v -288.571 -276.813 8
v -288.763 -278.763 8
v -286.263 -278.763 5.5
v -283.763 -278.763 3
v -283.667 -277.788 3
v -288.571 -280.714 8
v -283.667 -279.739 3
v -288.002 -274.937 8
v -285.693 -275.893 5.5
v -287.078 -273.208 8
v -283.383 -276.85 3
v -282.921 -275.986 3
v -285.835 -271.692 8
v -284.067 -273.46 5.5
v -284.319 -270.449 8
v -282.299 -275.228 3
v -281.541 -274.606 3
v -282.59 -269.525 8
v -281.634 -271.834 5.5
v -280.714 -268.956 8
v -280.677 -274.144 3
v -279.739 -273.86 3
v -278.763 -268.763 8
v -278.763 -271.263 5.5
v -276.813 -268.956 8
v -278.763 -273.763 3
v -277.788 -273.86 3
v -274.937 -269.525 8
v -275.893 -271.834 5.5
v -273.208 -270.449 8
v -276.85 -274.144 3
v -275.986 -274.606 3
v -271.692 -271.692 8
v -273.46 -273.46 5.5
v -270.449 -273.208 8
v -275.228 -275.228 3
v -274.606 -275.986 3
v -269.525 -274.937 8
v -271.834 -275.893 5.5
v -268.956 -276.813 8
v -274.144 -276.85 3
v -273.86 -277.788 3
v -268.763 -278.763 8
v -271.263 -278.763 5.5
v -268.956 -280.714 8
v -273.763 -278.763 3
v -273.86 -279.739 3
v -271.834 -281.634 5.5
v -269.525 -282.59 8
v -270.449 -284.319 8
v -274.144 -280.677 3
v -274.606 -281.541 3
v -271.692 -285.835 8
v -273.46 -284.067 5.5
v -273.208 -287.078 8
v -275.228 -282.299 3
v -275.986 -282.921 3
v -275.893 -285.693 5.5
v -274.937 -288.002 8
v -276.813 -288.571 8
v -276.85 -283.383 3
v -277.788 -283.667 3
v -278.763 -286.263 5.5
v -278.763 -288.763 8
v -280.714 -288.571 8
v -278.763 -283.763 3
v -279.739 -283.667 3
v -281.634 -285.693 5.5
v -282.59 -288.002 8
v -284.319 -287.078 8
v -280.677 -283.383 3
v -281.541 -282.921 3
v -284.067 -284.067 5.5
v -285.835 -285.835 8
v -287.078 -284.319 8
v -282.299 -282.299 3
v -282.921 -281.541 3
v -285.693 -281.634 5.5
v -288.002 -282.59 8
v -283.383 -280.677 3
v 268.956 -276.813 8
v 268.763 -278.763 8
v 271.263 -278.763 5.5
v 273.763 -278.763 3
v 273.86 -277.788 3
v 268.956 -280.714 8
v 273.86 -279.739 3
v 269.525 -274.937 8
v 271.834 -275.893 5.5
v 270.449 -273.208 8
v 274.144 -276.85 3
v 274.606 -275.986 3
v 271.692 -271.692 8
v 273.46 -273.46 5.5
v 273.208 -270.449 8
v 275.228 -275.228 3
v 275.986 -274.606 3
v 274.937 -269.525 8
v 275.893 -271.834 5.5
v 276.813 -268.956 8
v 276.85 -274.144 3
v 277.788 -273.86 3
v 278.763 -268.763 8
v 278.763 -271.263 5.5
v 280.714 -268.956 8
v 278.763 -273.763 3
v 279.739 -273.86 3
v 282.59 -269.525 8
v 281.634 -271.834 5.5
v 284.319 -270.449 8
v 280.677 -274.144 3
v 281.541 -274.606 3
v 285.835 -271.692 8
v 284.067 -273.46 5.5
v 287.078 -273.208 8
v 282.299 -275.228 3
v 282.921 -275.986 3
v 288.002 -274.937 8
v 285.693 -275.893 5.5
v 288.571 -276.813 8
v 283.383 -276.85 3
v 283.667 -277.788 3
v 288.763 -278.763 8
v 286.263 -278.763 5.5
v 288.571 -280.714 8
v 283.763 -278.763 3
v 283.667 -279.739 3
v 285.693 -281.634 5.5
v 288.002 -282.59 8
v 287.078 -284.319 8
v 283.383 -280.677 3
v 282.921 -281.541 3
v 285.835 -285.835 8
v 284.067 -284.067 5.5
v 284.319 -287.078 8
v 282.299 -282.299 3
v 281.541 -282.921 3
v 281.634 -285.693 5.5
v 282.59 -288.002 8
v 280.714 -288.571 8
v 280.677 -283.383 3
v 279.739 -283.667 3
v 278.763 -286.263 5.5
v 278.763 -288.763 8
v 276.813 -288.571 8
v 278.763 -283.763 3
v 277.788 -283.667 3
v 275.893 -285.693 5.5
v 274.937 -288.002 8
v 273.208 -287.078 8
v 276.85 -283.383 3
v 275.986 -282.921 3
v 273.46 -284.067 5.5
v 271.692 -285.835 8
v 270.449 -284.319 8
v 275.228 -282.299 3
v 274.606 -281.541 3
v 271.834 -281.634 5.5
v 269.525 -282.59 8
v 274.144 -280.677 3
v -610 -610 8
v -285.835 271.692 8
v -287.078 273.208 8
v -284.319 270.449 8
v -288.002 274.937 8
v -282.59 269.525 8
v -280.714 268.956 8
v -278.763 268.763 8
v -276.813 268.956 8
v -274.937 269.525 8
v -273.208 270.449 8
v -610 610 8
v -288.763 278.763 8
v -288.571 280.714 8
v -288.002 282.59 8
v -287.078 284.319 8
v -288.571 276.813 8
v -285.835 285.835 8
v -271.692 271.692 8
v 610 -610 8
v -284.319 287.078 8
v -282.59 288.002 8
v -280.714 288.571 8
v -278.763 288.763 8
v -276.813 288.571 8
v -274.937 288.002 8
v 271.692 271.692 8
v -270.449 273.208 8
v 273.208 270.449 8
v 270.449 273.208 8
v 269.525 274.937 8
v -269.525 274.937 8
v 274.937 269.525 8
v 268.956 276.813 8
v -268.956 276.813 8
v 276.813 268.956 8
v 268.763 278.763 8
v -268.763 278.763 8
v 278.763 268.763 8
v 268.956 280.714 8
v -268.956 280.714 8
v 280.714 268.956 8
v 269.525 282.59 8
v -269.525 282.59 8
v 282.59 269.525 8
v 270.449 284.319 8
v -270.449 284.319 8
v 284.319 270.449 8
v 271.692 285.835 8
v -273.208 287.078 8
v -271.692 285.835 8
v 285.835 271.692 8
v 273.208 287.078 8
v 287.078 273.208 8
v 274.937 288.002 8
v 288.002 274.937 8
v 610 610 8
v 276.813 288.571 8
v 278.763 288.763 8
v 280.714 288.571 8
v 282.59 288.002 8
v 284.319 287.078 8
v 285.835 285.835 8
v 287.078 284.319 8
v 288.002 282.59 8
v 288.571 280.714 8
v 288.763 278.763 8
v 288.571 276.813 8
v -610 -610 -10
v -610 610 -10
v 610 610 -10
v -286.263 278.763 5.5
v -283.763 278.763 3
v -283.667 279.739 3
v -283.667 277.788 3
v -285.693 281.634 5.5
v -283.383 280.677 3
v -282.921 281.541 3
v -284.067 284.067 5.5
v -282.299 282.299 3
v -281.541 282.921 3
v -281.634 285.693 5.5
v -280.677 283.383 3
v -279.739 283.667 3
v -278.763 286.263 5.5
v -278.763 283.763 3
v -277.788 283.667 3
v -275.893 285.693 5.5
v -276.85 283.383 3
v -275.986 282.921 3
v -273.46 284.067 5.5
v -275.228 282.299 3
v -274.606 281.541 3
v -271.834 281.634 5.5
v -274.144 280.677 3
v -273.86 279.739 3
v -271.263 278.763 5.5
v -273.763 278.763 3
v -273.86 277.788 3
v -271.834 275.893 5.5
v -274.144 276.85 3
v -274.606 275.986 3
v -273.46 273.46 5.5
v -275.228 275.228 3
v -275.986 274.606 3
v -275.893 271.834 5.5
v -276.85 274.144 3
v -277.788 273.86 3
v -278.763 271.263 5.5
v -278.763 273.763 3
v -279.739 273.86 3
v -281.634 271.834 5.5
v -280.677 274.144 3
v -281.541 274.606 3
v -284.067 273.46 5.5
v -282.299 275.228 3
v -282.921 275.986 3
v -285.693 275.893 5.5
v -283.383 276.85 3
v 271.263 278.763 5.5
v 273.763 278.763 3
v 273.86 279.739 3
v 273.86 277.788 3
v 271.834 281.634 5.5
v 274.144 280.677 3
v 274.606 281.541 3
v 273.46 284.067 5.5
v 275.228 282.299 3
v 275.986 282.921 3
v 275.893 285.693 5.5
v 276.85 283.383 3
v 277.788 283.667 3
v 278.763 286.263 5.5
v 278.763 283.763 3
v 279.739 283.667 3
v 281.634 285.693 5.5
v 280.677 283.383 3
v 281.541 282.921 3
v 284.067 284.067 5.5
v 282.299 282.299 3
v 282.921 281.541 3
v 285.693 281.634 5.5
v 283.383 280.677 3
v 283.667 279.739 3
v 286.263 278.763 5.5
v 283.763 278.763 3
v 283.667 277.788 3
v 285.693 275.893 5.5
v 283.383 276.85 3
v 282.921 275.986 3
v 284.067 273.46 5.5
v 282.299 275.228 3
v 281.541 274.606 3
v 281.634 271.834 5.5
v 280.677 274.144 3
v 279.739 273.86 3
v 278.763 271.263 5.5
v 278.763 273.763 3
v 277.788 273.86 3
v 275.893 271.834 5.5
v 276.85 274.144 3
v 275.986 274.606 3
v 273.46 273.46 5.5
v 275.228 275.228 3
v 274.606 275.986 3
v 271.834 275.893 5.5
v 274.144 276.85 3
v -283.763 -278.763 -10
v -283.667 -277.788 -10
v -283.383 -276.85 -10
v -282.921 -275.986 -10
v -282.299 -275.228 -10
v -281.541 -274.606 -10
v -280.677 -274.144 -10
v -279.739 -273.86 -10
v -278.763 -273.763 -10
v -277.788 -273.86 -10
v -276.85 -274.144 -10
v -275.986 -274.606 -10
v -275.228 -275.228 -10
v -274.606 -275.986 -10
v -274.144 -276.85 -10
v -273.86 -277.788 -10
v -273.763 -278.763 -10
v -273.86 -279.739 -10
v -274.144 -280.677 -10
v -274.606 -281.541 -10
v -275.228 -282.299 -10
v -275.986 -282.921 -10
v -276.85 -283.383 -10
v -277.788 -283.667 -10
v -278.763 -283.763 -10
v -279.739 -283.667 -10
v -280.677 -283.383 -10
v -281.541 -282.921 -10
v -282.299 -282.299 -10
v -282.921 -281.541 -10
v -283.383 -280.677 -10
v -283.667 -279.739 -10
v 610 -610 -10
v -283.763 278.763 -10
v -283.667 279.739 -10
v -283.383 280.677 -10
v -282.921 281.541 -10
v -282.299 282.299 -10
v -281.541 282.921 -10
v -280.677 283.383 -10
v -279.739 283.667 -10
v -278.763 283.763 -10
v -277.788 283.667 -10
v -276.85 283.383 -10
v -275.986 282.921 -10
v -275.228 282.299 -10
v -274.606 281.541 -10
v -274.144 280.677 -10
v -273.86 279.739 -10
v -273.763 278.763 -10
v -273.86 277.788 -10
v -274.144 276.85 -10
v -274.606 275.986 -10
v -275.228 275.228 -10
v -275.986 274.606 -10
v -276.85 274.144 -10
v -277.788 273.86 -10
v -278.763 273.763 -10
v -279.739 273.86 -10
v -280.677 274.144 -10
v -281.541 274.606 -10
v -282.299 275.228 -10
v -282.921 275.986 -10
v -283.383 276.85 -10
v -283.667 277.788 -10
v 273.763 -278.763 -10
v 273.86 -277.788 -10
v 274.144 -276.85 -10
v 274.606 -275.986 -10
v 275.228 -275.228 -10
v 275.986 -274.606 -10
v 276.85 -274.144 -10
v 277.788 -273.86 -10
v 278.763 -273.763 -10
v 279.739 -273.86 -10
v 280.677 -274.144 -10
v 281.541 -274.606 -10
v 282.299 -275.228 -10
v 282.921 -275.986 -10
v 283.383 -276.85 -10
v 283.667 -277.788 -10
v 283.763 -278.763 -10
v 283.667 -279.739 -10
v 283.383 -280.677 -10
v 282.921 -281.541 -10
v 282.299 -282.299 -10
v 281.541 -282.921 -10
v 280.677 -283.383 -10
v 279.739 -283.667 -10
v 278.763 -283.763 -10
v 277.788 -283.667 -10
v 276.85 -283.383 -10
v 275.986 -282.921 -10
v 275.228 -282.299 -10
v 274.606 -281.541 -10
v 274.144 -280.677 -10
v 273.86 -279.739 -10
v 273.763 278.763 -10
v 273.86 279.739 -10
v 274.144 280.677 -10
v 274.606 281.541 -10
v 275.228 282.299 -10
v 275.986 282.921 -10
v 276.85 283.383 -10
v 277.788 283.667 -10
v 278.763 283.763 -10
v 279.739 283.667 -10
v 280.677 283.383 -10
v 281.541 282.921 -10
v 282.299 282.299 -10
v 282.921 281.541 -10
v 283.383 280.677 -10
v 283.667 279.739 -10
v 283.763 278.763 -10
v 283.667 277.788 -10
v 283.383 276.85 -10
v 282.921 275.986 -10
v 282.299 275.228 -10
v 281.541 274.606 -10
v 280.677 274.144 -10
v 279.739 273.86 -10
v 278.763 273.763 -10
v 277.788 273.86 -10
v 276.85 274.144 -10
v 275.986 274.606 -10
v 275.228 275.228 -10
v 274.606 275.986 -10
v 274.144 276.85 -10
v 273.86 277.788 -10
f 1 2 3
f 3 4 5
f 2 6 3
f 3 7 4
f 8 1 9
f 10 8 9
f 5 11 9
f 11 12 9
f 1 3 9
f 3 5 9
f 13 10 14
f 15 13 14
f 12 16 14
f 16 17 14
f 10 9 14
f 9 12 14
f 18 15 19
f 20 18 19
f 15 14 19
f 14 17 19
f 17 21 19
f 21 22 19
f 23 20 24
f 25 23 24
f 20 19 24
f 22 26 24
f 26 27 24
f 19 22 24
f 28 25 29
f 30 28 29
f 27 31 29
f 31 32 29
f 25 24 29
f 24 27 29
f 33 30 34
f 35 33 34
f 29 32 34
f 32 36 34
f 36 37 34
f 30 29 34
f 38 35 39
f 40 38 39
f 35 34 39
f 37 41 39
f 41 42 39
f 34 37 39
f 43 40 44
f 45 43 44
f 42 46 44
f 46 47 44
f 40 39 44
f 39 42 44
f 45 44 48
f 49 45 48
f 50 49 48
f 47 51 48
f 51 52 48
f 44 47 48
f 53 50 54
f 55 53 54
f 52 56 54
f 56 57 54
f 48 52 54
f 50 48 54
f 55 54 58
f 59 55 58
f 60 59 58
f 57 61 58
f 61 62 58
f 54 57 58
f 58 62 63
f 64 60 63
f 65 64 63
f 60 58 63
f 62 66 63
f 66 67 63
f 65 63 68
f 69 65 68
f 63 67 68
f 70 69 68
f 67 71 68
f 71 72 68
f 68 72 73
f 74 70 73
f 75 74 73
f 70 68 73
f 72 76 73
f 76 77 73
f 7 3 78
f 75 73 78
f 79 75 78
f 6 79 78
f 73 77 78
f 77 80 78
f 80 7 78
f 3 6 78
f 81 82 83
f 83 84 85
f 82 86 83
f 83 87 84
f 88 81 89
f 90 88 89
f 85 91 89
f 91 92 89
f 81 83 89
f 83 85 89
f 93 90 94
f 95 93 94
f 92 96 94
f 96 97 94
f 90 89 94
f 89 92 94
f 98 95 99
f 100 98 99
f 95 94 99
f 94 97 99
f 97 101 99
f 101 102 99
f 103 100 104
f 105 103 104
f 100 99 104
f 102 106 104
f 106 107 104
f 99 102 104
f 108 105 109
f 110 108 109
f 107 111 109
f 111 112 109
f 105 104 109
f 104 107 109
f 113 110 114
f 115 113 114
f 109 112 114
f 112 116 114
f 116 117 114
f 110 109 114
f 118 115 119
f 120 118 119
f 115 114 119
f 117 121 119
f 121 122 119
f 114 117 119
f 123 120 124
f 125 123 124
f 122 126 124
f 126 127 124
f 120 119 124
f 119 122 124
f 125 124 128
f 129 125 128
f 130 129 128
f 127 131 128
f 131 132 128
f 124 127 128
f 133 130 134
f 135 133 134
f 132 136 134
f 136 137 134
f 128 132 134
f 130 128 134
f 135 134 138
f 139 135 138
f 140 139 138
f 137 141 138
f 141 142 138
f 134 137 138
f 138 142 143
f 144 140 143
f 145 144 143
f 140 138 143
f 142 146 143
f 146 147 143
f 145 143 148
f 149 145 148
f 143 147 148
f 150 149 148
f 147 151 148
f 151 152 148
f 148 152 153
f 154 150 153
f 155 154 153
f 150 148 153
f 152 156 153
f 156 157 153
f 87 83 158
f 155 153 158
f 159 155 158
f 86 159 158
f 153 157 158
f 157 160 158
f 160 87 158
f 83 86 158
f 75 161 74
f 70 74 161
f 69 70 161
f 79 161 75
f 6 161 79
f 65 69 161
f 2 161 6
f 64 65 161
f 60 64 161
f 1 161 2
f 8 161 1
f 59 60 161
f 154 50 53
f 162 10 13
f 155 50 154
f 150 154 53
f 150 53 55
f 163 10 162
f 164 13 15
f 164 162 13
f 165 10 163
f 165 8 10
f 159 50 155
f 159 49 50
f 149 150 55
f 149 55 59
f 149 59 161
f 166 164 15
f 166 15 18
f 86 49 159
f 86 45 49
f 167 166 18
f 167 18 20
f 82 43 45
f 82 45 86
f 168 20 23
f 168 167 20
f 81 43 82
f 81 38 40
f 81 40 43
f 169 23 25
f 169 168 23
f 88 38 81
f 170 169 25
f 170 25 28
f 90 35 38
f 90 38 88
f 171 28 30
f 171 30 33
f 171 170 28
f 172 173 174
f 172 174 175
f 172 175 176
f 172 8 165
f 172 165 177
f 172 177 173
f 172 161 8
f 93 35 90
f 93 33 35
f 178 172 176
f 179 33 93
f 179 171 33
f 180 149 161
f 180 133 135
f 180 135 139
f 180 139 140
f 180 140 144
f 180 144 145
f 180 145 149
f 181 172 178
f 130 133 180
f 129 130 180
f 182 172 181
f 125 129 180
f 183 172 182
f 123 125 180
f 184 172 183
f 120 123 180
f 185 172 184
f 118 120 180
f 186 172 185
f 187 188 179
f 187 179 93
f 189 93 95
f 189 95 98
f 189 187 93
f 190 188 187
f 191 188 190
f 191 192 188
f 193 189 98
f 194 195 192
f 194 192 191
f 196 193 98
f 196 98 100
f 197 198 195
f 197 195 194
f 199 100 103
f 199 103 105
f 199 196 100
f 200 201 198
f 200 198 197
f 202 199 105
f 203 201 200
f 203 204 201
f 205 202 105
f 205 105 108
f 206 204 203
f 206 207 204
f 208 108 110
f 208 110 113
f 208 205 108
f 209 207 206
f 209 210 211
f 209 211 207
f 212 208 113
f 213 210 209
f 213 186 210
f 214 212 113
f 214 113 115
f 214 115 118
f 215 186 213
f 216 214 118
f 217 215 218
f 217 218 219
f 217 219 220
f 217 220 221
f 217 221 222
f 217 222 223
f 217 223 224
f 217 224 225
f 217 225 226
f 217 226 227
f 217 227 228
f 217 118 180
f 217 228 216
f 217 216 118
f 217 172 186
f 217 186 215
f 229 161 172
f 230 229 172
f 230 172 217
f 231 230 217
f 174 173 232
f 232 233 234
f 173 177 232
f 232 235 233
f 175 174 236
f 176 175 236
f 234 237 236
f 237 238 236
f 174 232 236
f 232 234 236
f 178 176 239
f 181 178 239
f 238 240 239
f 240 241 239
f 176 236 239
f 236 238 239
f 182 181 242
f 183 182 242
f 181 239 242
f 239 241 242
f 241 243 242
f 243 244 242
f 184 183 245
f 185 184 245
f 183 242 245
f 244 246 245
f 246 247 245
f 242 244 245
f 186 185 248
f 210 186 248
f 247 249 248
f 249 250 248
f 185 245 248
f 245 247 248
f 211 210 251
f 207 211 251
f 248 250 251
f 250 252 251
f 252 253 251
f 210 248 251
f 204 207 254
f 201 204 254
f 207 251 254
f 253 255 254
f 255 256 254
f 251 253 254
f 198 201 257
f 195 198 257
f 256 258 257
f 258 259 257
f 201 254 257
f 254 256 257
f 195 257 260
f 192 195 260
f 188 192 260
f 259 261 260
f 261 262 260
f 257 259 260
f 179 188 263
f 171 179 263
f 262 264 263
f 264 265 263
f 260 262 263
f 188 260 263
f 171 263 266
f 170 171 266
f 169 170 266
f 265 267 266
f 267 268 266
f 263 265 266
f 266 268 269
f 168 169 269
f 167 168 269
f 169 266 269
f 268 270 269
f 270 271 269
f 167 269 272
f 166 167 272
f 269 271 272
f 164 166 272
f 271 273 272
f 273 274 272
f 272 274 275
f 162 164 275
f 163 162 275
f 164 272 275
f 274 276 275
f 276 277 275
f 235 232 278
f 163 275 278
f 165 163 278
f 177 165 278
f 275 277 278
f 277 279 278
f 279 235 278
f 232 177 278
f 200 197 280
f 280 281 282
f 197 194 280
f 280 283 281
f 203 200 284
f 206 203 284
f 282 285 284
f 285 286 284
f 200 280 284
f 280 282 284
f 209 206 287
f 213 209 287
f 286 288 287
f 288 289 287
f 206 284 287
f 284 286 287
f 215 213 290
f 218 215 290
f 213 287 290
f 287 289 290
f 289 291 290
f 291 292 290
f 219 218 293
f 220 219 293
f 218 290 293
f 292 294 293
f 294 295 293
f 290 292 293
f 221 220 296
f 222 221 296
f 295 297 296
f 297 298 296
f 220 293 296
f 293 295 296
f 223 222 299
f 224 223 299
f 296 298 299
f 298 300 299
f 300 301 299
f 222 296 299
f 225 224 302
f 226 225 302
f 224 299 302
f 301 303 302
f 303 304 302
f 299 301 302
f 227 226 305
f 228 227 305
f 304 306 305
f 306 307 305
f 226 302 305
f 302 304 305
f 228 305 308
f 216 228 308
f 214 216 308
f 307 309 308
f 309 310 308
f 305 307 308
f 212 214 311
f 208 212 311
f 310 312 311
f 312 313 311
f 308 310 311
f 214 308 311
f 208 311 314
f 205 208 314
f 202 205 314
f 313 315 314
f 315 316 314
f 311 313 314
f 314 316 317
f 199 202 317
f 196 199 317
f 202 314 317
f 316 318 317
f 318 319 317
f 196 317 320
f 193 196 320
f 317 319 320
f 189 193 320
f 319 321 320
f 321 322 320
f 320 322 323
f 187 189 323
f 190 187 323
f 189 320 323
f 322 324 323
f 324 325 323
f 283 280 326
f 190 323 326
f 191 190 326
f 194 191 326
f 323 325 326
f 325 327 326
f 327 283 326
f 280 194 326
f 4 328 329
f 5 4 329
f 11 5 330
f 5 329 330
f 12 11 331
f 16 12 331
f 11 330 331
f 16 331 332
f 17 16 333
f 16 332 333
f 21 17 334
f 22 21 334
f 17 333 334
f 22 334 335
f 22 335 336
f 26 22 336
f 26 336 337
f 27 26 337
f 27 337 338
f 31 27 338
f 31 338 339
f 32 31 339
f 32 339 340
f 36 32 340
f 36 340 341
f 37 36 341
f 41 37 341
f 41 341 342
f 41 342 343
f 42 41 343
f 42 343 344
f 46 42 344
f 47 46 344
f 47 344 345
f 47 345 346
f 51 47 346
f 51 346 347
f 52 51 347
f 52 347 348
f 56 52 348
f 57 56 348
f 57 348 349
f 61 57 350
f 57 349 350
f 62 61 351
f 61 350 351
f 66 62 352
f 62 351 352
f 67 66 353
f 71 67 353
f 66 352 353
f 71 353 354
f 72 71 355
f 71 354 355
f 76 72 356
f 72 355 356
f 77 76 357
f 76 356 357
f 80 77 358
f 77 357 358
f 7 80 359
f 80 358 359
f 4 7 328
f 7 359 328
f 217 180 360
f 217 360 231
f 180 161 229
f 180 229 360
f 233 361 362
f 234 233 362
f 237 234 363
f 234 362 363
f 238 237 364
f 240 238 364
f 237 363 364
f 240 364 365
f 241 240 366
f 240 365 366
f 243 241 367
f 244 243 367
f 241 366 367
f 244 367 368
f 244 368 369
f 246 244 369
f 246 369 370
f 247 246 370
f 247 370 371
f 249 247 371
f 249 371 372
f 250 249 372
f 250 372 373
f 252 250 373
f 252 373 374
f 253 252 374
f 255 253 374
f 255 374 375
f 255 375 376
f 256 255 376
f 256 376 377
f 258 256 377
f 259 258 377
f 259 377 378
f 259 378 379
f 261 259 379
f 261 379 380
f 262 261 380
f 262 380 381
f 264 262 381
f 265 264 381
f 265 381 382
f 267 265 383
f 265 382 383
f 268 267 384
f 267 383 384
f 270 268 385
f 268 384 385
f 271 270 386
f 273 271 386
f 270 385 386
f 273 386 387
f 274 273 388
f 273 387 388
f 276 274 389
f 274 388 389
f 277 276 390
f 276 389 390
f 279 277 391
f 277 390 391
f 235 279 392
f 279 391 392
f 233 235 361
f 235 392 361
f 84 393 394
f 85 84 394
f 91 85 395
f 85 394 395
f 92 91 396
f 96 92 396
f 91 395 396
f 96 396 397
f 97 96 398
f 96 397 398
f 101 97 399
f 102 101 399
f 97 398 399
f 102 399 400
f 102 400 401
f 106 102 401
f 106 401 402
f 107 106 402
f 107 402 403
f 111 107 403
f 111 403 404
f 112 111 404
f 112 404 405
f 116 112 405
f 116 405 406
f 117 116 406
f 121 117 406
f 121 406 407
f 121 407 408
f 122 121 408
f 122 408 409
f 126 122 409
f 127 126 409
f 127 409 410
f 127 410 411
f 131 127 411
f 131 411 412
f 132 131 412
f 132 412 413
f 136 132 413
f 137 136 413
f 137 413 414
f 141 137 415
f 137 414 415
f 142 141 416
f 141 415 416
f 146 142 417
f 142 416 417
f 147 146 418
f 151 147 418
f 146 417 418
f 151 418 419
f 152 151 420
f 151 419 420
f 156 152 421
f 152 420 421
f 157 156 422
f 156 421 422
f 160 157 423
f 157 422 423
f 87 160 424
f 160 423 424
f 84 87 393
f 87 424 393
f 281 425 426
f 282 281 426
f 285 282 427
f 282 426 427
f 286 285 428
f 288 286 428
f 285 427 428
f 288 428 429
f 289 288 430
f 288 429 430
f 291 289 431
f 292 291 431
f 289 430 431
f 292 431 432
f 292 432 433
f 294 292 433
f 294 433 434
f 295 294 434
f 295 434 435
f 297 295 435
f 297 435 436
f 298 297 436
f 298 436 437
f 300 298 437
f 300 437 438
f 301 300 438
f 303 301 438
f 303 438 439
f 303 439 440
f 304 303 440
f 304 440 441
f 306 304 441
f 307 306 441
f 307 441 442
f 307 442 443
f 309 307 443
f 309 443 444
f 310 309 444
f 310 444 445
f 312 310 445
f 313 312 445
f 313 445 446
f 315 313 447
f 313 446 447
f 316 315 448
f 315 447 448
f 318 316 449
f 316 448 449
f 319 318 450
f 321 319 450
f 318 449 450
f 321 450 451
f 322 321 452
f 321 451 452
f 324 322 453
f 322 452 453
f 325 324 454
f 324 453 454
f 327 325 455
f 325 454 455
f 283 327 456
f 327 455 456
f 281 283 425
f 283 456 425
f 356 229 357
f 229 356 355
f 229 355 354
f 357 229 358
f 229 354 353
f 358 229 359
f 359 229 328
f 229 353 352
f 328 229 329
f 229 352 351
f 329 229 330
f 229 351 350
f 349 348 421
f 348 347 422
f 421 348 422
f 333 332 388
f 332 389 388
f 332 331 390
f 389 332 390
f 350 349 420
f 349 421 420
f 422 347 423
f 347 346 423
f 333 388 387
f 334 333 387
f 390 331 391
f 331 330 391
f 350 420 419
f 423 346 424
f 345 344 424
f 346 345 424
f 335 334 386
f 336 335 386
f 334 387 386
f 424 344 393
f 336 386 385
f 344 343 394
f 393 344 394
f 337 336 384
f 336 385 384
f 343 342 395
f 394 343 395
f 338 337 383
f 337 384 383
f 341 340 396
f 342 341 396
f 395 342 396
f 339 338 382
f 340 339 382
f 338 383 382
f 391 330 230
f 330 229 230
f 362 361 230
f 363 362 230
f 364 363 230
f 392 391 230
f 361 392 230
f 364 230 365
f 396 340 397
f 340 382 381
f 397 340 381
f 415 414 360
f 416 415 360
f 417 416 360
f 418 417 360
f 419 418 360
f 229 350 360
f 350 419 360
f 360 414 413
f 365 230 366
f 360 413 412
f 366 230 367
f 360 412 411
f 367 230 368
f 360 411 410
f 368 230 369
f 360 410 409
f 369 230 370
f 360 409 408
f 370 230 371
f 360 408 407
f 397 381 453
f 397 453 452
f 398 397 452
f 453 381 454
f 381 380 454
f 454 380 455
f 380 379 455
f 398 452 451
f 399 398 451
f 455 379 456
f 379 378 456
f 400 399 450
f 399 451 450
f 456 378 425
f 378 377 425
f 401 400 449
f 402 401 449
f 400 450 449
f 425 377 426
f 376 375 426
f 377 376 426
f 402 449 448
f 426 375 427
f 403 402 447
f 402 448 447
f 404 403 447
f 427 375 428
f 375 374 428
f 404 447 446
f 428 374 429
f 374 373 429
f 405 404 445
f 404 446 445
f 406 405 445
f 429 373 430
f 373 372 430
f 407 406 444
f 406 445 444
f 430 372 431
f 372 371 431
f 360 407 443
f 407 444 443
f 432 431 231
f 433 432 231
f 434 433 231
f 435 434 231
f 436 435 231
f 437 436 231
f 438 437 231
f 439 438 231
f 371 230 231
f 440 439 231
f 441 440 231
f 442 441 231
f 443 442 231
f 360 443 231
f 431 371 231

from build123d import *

# Parameters (mm, degrees)
BOSS_EXTRUDE1_START = 8
SKETCH1_W           = 1220
SKETCH1_H           = 1220
BOSS_EXTRUDE1_DEPTH = 18
SKETCH2_R           = 5
CUT_EXTRUDE1_DEPTH  = 19
CHAMFER1_SIZE       = 5


with BuildPart() as part:
    # Sketch1 → Boss-Extrude1 (new body)
    with BuildSketch(Plane.XY.offset(BOSS_EXTRUDE1_START)):
        Rectangle(SKETCH1_W, SKETCH1_H)
    extrude(amount=-BOSS_EXTRUDE1_DEPTH)

    # Sketch2 → Cut-Extrude1 (cut, through all)
    with BuildSketch(Plane(origin=(0, 0, -10), x_dir=(-1, 0, 0), z_dir=(0, 0, -1))):
        with Locations((-278.763455967, 278.763455967)):
            Circle(SKETCH2_R)
        with Locations((-278.763455967, -278.763455967)):
            Circle(SKETCH2_R)
        with Locations((278.763455967, -278.763455967)):
            Circle(SKETCH2_R)
        with Locations((278.763455967, 278.763455967)):
            Circle(SKETCH2_R)
    extrude(amount=-CUT_EXTRUDE1_DEPTH, mode=Mode.SUBTRACT)

    # Chamfer1
    chamfer1_edges = [part.edges().sort_by_distance(p)[0] for p in [
        (-273.763455967, 278.763455967, 8),
        (-273.763455967, -278.763455967, 8),
        (283.763455967, -278.763455967, 8),
        (283.763455967, 278.763455967, 8),
    ]]
    chamfer(chamfer1_edges, length=CHAMFER1_SIZE)


solid = part.part
